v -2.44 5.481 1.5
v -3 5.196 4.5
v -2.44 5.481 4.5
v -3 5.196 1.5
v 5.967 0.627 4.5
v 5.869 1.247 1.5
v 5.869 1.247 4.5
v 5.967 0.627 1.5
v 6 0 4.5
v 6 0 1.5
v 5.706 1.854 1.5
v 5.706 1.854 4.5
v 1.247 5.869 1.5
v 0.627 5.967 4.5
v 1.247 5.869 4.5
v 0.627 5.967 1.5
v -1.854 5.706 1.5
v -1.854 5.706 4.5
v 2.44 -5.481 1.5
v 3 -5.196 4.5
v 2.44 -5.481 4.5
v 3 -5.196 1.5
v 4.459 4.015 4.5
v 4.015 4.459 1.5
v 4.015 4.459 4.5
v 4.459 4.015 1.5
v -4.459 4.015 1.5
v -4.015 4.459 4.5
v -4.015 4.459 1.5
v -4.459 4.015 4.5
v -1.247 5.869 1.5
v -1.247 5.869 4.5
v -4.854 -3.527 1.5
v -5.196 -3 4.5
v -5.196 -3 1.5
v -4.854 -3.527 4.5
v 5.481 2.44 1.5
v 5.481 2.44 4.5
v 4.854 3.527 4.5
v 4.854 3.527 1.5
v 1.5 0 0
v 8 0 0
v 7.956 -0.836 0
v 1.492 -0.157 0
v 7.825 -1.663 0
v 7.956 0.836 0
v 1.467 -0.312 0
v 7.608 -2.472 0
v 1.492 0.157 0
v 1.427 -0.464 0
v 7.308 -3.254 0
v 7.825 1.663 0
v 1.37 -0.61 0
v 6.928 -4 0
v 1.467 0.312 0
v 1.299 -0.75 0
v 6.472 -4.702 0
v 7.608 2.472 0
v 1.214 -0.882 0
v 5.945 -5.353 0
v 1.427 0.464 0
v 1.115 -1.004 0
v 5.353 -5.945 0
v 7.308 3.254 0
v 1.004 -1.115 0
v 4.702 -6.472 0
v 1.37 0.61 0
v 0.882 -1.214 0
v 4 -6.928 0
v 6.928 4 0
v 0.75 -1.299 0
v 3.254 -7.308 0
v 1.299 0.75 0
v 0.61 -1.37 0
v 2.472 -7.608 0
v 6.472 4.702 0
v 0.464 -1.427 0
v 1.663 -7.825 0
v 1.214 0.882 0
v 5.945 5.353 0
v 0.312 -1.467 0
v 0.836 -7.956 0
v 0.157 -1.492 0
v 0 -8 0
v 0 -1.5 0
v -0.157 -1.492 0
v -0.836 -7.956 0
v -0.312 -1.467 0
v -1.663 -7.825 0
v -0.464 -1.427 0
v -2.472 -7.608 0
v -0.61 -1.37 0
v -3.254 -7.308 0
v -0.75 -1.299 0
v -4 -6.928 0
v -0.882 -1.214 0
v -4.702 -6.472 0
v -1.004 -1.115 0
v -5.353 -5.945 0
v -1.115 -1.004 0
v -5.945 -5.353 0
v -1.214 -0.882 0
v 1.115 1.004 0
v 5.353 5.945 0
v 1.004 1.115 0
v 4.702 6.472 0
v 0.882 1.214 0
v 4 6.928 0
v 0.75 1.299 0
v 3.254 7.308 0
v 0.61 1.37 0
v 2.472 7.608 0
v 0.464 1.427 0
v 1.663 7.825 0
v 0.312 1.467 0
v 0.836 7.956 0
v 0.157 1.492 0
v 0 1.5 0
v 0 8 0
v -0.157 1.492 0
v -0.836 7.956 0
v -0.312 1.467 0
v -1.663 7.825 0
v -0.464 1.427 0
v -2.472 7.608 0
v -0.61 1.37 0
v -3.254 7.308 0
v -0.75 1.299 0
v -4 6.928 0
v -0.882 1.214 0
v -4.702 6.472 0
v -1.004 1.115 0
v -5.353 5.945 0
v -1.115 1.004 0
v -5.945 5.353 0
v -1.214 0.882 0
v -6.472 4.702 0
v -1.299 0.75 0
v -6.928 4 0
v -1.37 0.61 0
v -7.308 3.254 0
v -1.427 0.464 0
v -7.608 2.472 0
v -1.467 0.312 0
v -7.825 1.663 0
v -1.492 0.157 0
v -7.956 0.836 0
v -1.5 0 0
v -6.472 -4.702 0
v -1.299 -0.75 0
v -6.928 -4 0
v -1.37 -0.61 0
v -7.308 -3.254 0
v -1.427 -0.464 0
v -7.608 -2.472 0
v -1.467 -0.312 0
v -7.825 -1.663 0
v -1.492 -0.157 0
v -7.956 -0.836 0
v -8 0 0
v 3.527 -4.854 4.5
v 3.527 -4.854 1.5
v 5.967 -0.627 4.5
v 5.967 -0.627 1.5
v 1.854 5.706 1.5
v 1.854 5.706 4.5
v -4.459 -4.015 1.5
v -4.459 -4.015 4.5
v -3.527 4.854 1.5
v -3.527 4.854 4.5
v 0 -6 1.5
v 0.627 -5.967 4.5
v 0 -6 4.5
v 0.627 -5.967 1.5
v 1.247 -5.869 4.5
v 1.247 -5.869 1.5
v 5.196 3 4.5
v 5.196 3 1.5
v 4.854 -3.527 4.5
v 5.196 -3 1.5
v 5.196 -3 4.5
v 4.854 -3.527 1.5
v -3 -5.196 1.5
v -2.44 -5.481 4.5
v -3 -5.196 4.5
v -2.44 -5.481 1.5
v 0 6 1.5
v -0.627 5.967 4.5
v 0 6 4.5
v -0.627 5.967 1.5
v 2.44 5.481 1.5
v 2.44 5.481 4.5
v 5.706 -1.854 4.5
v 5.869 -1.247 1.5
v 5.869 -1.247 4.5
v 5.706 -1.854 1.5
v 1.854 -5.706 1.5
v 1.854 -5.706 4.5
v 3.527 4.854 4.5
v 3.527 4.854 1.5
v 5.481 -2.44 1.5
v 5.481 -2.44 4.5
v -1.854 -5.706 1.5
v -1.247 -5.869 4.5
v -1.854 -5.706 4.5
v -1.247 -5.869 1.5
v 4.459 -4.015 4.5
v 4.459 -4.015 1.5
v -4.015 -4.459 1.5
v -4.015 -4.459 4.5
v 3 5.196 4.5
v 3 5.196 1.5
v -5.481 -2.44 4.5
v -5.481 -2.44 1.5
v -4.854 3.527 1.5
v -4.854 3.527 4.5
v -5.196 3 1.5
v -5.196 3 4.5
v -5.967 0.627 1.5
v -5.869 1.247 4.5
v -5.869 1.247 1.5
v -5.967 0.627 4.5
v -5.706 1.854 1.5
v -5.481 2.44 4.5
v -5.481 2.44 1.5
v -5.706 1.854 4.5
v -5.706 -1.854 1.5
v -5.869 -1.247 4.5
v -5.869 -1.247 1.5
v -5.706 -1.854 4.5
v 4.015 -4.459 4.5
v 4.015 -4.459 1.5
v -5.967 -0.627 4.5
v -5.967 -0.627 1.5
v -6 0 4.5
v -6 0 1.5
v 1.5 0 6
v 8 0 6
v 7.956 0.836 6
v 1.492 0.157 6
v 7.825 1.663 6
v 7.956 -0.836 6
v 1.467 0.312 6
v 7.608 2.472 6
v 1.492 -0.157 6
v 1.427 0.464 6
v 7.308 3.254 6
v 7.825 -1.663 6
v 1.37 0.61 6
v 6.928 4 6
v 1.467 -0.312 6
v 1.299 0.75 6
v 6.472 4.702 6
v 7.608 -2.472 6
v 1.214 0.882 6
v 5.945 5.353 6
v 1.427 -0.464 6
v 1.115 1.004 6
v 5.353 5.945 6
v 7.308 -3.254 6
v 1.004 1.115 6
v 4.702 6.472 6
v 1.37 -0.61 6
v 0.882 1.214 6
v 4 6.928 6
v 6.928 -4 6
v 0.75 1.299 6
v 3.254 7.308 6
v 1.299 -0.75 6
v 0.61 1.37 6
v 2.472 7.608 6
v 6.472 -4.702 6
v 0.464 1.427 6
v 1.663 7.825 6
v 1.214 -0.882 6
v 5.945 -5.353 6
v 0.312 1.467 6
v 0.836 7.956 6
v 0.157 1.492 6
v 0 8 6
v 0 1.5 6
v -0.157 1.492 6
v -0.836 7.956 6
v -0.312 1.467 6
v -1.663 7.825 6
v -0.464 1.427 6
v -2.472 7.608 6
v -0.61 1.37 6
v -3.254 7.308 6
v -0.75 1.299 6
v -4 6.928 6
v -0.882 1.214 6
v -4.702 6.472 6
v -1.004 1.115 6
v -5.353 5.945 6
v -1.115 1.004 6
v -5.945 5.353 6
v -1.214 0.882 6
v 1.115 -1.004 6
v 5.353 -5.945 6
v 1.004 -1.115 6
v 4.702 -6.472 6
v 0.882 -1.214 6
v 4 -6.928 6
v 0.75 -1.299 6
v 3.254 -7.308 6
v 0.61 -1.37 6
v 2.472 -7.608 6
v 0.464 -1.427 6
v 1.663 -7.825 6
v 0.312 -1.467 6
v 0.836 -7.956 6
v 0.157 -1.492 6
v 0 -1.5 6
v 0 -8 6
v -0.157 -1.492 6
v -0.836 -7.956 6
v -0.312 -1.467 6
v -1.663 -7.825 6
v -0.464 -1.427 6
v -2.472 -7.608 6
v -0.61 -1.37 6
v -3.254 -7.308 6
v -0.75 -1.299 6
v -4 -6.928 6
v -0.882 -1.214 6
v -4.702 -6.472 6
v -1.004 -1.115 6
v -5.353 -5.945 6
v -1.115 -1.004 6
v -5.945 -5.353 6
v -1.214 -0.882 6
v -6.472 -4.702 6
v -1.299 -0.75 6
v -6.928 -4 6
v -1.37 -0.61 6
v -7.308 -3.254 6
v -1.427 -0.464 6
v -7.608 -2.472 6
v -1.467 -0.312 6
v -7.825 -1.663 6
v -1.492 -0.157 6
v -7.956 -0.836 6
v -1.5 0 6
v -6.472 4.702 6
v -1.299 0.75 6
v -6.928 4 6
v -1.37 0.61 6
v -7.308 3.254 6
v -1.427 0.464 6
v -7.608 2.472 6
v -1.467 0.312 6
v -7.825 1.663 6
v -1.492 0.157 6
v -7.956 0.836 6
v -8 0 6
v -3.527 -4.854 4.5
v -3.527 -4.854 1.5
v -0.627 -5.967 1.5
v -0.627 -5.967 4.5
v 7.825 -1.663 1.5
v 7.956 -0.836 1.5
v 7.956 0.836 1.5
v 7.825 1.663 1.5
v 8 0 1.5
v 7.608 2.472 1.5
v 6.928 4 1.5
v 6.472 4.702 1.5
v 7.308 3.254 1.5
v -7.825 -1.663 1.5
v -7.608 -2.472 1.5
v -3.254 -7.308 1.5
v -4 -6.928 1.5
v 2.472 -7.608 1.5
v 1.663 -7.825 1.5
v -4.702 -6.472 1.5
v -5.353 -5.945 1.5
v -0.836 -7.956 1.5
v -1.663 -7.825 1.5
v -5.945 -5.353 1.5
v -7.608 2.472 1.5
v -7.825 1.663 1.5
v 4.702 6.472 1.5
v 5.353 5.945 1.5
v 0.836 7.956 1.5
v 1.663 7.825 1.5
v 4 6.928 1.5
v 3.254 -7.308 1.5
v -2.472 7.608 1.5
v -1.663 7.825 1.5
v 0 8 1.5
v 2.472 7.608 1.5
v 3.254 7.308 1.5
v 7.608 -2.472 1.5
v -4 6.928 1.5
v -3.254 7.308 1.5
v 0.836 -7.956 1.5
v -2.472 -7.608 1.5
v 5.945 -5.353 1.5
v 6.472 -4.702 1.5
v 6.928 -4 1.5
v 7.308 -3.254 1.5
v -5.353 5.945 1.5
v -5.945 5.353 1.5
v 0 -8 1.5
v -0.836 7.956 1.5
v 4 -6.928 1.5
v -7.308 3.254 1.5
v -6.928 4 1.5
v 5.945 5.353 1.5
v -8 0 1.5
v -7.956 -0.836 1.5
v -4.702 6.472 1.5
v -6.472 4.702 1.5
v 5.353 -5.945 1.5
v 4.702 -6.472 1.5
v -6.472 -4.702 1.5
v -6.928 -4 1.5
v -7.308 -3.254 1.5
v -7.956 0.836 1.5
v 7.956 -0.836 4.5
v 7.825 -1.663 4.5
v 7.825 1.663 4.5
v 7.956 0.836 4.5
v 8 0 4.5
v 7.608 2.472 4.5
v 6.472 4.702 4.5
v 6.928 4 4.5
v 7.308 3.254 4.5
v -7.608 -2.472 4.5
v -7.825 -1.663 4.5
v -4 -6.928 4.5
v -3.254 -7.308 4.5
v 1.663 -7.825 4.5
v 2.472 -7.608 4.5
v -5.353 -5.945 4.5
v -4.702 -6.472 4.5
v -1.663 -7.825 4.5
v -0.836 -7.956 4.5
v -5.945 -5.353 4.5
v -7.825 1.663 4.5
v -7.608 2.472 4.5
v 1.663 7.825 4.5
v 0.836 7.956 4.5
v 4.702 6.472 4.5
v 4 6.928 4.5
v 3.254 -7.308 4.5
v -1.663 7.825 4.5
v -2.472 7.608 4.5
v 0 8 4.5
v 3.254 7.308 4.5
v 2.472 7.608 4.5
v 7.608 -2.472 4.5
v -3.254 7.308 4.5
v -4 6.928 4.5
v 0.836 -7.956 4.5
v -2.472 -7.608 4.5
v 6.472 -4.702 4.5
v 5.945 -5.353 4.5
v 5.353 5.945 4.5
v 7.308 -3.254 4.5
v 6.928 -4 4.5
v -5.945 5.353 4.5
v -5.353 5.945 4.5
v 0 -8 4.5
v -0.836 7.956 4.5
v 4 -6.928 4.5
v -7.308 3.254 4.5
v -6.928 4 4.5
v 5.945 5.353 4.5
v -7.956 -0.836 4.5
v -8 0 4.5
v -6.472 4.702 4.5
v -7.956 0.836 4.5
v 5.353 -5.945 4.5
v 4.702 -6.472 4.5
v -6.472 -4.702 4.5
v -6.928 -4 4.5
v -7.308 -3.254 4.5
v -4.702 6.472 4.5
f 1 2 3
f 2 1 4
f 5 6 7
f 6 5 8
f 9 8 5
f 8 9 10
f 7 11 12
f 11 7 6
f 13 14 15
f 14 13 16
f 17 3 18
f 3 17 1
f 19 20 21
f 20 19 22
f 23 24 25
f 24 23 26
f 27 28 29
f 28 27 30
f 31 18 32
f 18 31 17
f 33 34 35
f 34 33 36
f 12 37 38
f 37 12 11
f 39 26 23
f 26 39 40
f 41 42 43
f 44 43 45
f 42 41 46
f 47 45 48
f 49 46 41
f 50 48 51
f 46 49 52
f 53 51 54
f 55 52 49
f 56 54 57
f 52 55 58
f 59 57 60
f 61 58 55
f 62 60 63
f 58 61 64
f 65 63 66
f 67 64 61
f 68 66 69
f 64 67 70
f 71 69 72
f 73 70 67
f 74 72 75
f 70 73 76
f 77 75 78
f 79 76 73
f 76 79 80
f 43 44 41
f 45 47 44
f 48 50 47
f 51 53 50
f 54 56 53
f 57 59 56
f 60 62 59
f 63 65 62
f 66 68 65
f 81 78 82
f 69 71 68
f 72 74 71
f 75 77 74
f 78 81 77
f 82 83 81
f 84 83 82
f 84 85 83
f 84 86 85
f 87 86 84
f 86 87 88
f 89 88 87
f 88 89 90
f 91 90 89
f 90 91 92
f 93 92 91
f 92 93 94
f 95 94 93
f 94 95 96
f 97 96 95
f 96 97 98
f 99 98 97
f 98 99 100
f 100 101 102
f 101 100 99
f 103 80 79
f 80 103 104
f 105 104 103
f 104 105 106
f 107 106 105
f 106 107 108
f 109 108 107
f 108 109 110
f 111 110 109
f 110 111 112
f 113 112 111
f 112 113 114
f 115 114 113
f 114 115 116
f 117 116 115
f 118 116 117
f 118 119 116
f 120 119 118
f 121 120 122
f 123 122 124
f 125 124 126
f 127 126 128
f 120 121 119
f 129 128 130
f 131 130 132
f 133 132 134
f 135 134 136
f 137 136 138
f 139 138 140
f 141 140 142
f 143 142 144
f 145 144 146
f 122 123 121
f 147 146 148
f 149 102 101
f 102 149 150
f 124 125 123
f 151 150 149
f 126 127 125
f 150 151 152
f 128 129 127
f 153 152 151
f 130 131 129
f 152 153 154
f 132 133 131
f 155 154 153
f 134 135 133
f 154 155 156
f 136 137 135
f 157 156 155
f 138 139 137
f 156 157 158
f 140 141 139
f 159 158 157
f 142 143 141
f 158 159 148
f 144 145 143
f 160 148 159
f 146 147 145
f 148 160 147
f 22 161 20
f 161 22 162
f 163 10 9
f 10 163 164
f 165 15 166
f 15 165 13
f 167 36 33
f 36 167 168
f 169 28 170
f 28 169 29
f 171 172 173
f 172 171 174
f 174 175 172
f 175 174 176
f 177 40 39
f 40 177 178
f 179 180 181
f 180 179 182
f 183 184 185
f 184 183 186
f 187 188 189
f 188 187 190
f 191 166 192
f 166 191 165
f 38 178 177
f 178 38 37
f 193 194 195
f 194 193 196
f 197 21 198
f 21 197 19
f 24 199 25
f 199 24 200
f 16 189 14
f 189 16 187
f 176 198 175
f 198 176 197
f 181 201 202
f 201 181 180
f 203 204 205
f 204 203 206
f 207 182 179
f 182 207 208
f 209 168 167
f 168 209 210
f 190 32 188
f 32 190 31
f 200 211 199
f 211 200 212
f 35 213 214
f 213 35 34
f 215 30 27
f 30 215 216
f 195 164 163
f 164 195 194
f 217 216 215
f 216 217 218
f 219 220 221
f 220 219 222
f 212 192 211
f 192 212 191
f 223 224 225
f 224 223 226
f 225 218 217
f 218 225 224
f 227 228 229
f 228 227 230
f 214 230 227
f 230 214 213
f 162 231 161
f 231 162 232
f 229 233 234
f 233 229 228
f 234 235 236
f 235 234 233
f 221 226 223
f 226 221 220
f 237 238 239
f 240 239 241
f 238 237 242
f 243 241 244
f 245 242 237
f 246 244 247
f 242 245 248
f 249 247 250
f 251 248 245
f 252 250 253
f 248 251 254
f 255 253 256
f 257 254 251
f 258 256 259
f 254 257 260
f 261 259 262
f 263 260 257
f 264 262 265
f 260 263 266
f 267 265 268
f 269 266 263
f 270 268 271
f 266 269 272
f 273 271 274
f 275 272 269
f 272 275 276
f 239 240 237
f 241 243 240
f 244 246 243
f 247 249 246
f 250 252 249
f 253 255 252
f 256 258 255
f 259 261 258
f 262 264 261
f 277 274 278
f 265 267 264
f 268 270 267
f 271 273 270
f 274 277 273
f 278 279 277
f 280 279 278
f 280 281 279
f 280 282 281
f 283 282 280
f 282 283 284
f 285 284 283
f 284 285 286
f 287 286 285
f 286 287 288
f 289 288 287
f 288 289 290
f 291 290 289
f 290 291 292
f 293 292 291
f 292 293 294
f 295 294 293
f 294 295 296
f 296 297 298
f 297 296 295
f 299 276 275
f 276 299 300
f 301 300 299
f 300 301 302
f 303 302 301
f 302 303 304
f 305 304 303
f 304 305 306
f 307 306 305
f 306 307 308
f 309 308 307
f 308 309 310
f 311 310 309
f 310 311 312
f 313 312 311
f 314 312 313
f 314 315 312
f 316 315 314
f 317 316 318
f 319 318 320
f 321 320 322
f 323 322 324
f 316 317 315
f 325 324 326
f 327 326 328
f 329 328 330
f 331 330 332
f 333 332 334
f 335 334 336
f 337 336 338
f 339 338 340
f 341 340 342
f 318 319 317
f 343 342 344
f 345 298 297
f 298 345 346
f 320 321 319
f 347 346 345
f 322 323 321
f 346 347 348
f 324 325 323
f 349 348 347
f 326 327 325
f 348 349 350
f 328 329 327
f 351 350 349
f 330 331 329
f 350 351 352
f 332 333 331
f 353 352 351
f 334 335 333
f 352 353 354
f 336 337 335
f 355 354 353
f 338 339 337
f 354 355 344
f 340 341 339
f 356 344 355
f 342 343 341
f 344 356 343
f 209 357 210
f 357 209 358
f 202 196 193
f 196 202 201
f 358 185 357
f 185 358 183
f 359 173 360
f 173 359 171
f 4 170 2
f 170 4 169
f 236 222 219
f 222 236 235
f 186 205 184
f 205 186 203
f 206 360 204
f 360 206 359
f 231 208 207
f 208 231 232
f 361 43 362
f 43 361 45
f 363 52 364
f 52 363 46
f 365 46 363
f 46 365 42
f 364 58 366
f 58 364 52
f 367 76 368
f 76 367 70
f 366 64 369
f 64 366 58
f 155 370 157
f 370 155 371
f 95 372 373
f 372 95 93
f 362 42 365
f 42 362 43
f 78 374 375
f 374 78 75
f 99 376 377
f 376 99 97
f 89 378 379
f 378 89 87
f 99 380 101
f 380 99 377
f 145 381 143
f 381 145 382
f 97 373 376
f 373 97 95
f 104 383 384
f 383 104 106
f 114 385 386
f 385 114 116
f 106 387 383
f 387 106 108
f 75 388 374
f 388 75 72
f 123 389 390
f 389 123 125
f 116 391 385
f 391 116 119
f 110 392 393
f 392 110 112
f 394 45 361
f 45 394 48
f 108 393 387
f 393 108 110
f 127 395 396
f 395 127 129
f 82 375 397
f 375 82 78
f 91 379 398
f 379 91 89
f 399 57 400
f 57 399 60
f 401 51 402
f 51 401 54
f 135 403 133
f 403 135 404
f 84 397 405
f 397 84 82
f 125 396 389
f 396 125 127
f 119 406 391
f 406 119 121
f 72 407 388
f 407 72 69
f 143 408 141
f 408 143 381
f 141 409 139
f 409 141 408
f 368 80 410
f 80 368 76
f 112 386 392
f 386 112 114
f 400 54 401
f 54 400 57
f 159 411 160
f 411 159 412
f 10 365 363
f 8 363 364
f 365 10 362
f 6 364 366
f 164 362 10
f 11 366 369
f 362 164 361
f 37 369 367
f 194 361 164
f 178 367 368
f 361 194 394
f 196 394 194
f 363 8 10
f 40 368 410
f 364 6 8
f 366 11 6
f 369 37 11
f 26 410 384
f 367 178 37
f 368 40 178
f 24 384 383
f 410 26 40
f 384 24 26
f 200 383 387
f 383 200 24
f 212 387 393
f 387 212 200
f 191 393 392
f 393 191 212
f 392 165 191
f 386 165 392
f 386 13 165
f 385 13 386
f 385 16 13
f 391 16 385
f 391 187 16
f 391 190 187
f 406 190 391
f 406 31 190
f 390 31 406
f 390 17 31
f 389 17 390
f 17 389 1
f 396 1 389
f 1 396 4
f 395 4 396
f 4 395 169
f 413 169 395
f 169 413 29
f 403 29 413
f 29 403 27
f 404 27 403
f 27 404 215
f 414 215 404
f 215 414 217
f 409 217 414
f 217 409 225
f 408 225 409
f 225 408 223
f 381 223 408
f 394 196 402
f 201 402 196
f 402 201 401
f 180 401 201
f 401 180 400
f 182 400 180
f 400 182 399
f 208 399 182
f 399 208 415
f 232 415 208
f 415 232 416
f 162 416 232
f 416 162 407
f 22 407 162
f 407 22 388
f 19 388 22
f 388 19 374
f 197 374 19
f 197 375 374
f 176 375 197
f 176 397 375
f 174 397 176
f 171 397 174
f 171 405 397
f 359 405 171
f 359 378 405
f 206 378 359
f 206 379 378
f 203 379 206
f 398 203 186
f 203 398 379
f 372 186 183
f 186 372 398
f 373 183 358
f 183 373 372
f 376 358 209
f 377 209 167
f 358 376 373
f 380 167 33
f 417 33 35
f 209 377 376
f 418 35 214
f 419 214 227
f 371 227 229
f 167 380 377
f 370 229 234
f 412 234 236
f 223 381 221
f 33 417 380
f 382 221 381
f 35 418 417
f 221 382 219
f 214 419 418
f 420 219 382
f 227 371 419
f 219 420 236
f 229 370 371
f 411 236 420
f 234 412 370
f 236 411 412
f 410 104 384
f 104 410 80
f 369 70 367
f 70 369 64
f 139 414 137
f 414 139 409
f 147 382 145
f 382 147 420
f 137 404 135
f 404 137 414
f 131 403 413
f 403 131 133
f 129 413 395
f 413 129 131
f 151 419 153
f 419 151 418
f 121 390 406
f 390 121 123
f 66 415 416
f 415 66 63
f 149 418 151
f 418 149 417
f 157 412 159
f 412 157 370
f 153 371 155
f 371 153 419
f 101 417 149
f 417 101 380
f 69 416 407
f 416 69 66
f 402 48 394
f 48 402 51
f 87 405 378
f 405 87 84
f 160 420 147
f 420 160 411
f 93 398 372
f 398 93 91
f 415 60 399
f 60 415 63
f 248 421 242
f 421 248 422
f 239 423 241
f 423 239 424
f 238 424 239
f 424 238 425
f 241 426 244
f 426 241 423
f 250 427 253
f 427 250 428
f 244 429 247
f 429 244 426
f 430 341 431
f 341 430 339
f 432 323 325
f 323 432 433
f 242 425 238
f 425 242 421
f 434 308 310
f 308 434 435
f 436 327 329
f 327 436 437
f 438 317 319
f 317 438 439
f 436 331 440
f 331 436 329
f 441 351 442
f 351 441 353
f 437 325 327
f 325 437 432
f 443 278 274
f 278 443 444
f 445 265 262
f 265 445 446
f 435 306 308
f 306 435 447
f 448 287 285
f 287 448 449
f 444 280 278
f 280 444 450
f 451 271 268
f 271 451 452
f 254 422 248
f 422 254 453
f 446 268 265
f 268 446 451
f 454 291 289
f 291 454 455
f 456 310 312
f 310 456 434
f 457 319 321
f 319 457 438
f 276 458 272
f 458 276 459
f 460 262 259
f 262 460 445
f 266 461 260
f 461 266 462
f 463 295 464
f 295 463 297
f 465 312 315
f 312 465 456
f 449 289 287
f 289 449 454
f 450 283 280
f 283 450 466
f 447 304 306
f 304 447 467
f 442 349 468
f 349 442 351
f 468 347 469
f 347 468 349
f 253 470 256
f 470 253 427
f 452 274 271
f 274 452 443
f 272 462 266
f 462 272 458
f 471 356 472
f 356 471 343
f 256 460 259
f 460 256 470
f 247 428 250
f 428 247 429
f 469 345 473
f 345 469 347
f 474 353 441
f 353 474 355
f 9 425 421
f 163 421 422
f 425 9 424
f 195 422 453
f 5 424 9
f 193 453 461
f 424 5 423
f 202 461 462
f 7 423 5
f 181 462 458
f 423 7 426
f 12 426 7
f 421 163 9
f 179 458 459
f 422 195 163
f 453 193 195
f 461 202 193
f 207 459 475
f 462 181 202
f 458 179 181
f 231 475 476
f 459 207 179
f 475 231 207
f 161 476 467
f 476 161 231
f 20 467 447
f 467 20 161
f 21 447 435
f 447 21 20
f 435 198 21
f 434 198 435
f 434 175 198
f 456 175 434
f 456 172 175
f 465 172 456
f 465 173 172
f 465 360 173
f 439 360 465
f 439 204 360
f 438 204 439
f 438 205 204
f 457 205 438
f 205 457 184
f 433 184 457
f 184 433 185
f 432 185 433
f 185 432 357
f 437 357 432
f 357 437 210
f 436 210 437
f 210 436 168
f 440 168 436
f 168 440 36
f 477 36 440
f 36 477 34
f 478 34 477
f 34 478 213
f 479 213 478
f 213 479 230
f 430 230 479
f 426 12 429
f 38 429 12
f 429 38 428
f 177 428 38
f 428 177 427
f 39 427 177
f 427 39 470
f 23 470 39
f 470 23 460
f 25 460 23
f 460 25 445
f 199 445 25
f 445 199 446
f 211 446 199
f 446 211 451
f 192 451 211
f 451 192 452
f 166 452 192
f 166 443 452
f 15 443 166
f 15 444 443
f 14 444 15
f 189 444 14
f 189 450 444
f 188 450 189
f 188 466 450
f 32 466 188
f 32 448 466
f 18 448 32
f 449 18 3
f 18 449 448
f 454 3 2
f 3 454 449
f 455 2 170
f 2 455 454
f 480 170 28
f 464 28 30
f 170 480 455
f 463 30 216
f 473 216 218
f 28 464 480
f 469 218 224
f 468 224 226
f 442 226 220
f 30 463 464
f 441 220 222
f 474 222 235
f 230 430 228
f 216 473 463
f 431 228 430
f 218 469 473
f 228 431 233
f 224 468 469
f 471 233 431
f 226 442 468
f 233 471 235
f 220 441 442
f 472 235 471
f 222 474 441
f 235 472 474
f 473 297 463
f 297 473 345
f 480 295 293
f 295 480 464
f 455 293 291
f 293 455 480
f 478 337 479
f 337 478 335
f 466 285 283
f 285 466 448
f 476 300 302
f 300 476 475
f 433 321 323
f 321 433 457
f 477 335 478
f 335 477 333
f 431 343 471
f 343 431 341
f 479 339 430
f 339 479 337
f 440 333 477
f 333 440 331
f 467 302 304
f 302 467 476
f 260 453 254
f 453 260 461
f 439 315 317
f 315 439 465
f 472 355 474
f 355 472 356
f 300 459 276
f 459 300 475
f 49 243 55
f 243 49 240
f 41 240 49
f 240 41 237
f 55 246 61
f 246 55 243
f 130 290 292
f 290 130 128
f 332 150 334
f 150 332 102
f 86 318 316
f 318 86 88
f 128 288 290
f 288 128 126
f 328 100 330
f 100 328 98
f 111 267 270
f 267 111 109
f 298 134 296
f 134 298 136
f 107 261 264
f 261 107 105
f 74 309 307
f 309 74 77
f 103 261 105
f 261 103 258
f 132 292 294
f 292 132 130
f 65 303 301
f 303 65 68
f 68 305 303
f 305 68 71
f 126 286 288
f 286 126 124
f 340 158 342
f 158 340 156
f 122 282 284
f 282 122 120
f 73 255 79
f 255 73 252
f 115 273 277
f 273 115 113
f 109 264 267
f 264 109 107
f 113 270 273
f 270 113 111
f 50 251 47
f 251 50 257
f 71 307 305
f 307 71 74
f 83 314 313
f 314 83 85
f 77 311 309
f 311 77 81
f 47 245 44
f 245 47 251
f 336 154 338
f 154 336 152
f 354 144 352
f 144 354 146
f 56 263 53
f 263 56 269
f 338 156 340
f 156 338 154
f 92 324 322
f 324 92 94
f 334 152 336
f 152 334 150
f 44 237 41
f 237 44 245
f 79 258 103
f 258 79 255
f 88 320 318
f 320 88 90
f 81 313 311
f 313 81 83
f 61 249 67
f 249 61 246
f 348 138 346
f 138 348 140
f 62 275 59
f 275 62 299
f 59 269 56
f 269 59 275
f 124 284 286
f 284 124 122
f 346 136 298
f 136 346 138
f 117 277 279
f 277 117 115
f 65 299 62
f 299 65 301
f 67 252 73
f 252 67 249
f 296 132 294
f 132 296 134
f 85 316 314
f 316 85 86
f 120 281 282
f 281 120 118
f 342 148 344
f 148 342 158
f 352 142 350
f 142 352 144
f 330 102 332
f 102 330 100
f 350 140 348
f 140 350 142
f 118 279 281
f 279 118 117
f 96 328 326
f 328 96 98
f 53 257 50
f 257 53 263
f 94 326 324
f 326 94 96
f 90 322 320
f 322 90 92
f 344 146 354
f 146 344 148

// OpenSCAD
// Plain idler pulley with retaining flanges.
$fn = 60;
eps = 0.02;
bore_d = 3;
body_d = 12;
width = 6;
flange_t = 1.5;
difference() {
    union() {
        cylinder(d=body_d,h=width);
        cylinder(d=body_d+4,h=flange_t);
        translate([0,0,width-flange_t]) cylinder(d=body_d+4,h=flange_t);
    }
    translate([0,0,-eps]) cylinder(d=bore_d,h=width+2*eps);
}
